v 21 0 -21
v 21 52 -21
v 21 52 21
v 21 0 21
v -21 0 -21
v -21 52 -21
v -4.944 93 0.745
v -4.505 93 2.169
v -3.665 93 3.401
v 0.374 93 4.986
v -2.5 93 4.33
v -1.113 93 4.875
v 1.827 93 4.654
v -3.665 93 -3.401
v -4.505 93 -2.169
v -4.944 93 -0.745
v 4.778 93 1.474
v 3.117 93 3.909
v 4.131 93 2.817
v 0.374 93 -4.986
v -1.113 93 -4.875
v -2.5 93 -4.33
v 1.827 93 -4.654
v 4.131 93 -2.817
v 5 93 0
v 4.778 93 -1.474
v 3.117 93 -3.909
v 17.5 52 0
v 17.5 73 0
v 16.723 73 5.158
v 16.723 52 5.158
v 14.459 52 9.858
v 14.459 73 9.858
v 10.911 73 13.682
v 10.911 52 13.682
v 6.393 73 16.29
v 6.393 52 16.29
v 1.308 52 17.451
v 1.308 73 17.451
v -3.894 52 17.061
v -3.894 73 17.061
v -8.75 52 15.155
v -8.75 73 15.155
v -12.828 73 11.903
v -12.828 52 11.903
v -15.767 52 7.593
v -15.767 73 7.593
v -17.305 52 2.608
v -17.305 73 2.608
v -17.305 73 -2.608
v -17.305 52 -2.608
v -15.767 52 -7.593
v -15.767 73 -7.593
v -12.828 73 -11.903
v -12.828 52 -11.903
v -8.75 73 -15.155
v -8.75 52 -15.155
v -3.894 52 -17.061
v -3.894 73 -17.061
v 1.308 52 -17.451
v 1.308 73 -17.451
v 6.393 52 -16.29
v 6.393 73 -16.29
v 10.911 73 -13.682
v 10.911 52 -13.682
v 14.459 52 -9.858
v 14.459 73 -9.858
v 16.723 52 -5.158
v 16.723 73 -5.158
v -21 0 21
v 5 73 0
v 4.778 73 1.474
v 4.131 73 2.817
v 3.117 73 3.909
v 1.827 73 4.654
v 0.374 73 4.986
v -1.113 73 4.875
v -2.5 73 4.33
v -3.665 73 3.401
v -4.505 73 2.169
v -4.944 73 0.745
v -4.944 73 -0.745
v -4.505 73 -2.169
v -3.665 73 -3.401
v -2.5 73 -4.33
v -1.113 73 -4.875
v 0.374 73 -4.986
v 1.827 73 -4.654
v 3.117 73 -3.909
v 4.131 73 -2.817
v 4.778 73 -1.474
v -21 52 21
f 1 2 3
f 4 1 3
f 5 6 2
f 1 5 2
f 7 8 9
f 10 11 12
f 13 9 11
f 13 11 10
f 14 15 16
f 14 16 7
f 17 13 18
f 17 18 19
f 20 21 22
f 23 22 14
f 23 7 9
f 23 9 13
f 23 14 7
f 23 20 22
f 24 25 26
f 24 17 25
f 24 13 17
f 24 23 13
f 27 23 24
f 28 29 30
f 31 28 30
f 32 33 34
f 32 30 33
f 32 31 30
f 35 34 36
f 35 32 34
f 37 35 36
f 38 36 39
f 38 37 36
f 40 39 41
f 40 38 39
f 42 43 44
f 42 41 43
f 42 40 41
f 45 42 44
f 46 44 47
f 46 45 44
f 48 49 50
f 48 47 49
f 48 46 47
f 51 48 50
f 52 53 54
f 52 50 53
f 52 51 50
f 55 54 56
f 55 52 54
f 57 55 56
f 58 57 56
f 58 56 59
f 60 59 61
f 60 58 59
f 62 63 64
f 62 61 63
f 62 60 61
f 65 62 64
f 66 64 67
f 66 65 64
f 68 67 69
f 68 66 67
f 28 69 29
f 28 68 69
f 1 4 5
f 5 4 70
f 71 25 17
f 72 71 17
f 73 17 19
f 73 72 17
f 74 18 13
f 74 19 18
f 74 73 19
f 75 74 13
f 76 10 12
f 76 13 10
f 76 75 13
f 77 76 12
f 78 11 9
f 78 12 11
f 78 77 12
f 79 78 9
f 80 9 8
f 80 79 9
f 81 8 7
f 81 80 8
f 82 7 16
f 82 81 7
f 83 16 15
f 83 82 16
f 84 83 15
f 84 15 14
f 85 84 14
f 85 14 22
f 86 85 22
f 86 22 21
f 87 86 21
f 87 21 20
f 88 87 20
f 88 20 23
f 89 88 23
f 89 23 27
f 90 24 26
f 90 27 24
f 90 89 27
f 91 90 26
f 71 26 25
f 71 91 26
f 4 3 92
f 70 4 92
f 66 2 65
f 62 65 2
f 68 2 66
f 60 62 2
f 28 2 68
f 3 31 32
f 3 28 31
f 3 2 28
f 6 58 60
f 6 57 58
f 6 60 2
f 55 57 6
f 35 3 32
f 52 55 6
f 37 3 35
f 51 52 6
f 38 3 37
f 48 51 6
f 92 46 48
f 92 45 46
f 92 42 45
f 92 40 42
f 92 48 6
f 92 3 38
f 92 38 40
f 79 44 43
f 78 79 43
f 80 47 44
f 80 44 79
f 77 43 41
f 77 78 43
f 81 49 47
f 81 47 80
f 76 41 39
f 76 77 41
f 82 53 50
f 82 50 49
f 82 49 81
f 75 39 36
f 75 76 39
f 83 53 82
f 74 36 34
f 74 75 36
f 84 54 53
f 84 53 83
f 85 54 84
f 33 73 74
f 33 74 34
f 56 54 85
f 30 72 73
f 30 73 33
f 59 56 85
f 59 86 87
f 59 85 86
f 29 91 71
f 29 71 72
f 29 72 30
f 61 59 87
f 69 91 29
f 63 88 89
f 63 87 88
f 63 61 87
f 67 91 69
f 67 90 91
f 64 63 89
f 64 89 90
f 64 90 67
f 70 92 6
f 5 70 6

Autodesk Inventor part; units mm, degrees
ref_plane "YZ Plane" through (0, 0, 0) normal (1, 0, 0) x (0, 1, 0)
ref_plane "XZ Plane" through (0, 0, 0) normal (0, 1, 0) x (-1, 0, 0)
ref_plane "XY Plane" through (0, 0, 0) normal (0, 0, 1) x (1, 0, 0)
sketch "Sketch1" plane through (0, 0, 0) normal (0, 1, 0) x (-1, 0, 0)
  line L0 (-21, 21) -> (21, 21)
  line L1 (21, 21) -> (21, -21)
  line L2 (21, -21) -> (-21, -21)
  line L3 (-21, -21) -> (-21, 21)
  line L4 (-21, 21) -> (21, -21) construction
  line L5 (21, 21) -> (-21, -21) construction
  point P0 (0, 0)
  dimension "d0" = 42
  dimension "d1" = 42
extrude "Extrusion1" add sketch "Sketch1" along normal blind 52
sketch "Sketch2" plane through (0, 52, 0) normal (0, 1, 0) x (1, 0, 0)
  circle A0 centre (0, 0) radius 17.5
  circle A1 centre (0, 0) radius 5
  dimension "d4" = 35
  dimension "d7" = 10
extrude "Extrusion2" add sketch "Sketch2" along normal blind 21 contours A0 | A1
sketch "Sketch3" plane through (0, 73, 0) normal (0, 1, 0) x (1, 0, 0)
  circle A0 centre (0, 0) radius 5
  dimension "d8" = 10
extrude "Extrusion3" add sketch "Sketch3" along normal blind 20
properties part number "StepperMotor"
